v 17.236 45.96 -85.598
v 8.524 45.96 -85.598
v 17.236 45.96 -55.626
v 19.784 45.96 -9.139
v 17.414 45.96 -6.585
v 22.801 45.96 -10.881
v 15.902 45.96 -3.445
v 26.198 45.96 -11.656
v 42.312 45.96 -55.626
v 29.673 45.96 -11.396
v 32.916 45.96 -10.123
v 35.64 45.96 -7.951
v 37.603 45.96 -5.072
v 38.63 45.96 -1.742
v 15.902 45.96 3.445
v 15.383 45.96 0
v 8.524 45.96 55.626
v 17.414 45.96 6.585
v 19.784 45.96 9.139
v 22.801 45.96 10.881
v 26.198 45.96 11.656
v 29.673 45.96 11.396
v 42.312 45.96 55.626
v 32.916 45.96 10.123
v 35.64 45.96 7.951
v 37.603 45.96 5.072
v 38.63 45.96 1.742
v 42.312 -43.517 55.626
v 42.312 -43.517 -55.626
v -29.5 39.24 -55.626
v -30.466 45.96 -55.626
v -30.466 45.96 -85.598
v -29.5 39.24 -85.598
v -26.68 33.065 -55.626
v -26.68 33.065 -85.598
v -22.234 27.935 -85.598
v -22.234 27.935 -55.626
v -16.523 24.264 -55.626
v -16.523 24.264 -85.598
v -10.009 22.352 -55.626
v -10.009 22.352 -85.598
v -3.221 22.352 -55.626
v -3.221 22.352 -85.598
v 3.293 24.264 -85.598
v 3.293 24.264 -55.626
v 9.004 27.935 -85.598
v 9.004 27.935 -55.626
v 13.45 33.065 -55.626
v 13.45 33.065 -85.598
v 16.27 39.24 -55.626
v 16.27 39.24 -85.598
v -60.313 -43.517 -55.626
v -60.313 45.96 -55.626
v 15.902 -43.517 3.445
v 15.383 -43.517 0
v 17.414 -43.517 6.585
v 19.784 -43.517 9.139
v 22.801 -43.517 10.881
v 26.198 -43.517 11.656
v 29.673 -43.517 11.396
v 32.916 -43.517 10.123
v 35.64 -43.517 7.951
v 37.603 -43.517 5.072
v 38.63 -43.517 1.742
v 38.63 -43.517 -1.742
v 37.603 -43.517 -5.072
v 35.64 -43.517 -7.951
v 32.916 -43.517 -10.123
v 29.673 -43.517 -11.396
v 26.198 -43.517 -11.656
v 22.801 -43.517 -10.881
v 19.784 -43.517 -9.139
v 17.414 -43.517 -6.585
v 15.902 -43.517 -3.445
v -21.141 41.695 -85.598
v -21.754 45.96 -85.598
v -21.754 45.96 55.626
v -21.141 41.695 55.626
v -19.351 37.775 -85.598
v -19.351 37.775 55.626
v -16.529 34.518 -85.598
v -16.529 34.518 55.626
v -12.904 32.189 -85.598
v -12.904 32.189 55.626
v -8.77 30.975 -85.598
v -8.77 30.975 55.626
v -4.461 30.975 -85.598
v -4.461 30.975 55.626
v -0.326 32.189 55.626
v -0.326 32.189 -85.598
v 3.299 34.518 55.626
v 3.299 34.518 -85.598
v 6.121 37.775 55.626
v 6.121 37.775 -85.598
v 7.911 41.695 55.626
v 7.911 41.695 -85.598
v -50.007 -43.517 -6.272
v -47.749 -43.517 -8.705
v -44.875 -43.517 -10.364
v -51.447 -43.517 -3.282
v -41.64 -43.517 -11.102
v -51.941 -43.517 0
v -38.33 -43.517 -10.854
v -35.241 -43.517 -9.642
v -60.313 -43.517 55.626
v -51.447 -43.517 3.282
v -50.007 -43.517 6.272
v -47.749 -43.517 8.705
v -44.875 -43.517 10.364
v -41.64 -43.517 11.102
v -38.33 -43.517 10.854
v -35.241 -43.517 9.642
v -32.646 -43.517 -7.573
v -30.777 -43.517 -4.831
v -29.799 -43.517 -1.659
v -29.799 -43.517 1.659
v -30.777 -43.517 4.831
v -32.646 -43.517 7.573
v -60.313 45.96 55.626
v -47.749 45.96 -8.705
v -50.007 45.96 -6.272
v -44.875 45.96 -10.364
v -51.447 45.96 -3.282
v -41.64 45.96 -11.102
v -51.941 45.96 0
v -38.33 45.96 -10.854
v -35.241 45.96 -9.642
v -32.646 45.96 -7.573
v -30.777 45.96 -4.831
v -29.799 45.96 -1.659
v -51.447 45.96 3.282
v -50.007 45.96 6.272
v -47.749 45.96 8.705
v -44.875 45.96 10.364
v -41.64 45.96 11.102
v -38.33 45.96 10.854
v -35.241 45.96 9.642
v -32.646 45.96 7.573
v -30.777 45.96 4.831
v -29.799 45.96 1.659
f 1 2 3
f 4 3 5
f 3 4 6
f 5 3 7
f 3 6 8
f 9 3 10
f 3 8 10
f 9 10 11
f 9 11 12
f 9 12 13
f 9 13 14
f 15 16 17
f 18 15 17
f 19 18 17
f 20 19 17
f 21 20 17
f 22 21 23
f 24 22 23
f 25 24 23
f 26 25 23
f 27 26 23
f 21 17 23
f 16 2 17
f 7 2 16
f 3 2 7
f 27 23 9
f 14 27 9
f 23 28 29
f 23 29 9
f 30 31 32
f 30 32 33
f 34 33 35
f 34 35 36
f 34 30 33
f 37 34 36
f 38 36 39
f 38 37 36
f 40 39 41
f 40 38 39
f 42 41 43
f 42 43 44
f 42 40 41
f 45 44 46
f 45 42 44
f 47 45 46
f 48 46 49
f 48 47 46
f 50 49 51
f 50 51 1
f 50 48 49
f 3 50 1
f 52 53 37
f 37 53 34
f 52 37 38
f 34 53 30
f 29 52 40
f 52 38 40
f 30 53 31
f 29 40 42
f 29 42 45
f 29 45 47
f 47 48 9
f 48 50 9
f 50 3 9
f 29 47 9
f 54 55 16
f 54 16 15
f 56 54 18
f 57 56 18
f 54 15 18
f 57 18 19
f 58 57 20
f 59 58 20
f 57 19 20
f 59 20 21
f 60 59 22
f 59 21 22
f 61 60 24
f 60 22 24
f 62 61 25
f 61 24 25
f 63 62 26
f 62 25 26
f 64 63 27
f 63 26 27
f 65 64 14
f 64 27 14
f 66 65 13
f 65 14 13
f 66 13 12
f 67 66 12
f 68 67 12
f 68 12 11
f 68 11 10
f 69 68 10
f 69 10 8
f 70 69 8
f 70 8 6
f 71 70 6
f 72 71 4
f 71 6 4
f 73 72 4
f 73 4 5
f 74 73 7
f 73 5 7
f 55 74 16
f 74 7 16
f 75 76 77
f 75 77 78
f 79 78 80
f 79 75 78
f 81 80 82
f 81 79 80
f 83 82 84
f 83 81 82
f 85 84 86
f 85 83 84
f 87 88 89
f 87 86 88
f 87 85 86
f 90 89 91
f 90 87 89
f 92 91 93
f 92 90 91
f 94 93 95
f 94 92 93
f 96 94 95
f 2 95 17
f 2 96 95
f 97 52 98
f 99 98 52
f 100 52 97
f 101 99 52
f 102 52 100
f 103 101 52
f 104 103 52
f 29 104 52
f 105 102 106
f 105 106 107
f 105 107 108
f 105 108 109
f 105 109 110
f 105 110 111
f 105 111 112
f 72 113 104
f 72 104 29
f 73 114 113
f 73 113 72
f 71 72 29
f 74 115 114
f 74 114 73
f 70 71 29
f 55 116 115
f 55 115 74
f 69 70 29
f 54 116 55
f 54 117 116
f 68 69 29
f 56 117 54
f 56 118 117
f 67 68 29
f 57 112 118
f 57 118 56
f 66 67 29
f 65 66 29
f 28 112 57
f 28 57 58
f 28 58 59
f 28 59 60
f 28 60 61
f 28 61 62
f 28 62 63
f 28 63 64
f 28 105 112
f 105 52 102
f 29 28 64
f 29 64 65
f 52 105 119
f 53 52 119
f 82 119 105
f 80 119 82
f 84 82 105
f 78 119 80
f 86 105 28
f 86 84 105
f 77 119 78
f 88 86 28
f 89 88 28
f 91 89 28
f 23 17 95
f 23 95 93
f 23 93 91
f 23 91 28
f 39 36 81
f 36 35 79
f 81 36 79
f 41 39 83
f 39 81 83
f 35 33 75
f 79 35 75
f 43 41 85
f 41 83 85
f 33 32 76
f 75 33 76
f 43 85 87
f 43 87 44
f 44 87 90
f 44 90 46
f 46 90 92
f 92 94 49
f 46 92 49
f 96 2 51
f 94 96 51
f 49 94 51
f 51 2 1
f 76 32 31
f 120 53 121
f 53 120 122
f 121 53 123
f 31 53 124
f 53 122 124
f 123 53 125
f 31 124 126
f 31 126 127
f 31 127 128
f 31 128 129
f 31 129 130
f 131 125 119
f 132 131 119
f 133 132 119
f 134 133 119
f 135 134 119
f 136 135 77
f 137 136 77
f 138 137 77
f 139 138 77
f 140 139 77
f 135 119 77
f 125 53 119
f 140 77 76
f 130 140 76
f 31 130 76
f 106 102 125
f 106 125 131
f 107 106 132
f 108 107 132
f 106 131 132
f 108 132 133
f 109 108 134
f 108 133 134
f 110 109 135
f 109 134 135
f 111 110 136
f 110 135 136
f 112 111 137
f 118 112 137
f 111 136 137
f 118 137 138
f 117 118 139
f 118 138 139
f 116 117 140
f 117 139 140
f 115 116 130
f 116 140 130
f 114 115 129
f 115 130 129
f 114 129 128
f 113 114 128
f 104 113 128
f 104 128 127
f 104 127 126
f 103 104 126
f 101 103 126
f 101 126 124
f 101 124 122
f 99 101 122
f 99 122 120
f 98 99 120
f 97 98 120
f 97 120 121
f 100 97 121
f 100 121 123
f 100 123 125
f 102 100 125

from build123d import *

# Parameters (mm, degrees)
F0_W     = 102.6246032535
F0_H     = 89.4768349826
F1_DEPTH = 55.626
F3_DEPTH = 141.224
F4_DEPTH = 156.718
F5_R     = 11.6889879412
F6_DEPTH = 134.874
F7_R     = 11.1336119635
F8_DEPTH = 268.478


with BuildPart() as f1:
    # F0 (on Top) → F1 (new body, symmetric)
    with BuildSketch(Plane.XY):
        with Locations((-9.000580439, 1.2215245515)):
            Rectangle(F0_W, F0_H)
    extrude(amount=F1_DEPTH, both=True)

    # F2 (on face) → F3 (join)
    with BuildSketch(Plane.XY.offset(55.626)):
        with BuildLine():
            ThreePointArc((-30.4661283079, 45.9599420428), (-6.615057122, 22.1088708569), (17.2360140639, 45.9599420428))
            Line((17.2360140639, 45.9599420428), (8.524204708, 45.9599420428))
            ThreePointArc((8.524204708, 45.9599420428), (-6.615057122, 30.8206802129), (-21.7543189519, 45.9599420428))
            Line((-21.7543189519, 45.9599420428), (-30.4661283079, 45.9599420428))
        make_face()
    extrude(amount=-F3_DEPTH)

    # F4 (cut): a face of the model
    f4_faces = [f1.faces().sort_by_distance(p)[0] for p in [
        (-6.615057122, 39.5346397628, -55.626),
    ]]
    extrude(f4_faces, amount=-F4_DEPTH, mode=Mode.SUBTRACT)

    # F5 (on face) → F6 (cut, symmetric)
    with BuildSketch(Plane(origin=(0, 45.9599420428, 0), x_dir=(-1, 0, 0), z_dir=(0, 1, 0))):
        with Locations((-27.0718317479, 0)):
            Circle(F5_R)
    extrude(amount=F6_DEPTH, both=True, mode=Mode.SUBTRACT)

    # F7 (on face) → F8 (cut)
    with BuildSketch(Plane(origin=(0, 45.9599420428, 0), x_dir=(-1, 0, 0), z_dir=(0, 1, 0))):
        with Locations((40.8077836037, 0)):
            Circle(F7_R)
    extrude(amount=-F8_DEPTH, mode=Mode.SUBTRACT)


solid = f1.part
